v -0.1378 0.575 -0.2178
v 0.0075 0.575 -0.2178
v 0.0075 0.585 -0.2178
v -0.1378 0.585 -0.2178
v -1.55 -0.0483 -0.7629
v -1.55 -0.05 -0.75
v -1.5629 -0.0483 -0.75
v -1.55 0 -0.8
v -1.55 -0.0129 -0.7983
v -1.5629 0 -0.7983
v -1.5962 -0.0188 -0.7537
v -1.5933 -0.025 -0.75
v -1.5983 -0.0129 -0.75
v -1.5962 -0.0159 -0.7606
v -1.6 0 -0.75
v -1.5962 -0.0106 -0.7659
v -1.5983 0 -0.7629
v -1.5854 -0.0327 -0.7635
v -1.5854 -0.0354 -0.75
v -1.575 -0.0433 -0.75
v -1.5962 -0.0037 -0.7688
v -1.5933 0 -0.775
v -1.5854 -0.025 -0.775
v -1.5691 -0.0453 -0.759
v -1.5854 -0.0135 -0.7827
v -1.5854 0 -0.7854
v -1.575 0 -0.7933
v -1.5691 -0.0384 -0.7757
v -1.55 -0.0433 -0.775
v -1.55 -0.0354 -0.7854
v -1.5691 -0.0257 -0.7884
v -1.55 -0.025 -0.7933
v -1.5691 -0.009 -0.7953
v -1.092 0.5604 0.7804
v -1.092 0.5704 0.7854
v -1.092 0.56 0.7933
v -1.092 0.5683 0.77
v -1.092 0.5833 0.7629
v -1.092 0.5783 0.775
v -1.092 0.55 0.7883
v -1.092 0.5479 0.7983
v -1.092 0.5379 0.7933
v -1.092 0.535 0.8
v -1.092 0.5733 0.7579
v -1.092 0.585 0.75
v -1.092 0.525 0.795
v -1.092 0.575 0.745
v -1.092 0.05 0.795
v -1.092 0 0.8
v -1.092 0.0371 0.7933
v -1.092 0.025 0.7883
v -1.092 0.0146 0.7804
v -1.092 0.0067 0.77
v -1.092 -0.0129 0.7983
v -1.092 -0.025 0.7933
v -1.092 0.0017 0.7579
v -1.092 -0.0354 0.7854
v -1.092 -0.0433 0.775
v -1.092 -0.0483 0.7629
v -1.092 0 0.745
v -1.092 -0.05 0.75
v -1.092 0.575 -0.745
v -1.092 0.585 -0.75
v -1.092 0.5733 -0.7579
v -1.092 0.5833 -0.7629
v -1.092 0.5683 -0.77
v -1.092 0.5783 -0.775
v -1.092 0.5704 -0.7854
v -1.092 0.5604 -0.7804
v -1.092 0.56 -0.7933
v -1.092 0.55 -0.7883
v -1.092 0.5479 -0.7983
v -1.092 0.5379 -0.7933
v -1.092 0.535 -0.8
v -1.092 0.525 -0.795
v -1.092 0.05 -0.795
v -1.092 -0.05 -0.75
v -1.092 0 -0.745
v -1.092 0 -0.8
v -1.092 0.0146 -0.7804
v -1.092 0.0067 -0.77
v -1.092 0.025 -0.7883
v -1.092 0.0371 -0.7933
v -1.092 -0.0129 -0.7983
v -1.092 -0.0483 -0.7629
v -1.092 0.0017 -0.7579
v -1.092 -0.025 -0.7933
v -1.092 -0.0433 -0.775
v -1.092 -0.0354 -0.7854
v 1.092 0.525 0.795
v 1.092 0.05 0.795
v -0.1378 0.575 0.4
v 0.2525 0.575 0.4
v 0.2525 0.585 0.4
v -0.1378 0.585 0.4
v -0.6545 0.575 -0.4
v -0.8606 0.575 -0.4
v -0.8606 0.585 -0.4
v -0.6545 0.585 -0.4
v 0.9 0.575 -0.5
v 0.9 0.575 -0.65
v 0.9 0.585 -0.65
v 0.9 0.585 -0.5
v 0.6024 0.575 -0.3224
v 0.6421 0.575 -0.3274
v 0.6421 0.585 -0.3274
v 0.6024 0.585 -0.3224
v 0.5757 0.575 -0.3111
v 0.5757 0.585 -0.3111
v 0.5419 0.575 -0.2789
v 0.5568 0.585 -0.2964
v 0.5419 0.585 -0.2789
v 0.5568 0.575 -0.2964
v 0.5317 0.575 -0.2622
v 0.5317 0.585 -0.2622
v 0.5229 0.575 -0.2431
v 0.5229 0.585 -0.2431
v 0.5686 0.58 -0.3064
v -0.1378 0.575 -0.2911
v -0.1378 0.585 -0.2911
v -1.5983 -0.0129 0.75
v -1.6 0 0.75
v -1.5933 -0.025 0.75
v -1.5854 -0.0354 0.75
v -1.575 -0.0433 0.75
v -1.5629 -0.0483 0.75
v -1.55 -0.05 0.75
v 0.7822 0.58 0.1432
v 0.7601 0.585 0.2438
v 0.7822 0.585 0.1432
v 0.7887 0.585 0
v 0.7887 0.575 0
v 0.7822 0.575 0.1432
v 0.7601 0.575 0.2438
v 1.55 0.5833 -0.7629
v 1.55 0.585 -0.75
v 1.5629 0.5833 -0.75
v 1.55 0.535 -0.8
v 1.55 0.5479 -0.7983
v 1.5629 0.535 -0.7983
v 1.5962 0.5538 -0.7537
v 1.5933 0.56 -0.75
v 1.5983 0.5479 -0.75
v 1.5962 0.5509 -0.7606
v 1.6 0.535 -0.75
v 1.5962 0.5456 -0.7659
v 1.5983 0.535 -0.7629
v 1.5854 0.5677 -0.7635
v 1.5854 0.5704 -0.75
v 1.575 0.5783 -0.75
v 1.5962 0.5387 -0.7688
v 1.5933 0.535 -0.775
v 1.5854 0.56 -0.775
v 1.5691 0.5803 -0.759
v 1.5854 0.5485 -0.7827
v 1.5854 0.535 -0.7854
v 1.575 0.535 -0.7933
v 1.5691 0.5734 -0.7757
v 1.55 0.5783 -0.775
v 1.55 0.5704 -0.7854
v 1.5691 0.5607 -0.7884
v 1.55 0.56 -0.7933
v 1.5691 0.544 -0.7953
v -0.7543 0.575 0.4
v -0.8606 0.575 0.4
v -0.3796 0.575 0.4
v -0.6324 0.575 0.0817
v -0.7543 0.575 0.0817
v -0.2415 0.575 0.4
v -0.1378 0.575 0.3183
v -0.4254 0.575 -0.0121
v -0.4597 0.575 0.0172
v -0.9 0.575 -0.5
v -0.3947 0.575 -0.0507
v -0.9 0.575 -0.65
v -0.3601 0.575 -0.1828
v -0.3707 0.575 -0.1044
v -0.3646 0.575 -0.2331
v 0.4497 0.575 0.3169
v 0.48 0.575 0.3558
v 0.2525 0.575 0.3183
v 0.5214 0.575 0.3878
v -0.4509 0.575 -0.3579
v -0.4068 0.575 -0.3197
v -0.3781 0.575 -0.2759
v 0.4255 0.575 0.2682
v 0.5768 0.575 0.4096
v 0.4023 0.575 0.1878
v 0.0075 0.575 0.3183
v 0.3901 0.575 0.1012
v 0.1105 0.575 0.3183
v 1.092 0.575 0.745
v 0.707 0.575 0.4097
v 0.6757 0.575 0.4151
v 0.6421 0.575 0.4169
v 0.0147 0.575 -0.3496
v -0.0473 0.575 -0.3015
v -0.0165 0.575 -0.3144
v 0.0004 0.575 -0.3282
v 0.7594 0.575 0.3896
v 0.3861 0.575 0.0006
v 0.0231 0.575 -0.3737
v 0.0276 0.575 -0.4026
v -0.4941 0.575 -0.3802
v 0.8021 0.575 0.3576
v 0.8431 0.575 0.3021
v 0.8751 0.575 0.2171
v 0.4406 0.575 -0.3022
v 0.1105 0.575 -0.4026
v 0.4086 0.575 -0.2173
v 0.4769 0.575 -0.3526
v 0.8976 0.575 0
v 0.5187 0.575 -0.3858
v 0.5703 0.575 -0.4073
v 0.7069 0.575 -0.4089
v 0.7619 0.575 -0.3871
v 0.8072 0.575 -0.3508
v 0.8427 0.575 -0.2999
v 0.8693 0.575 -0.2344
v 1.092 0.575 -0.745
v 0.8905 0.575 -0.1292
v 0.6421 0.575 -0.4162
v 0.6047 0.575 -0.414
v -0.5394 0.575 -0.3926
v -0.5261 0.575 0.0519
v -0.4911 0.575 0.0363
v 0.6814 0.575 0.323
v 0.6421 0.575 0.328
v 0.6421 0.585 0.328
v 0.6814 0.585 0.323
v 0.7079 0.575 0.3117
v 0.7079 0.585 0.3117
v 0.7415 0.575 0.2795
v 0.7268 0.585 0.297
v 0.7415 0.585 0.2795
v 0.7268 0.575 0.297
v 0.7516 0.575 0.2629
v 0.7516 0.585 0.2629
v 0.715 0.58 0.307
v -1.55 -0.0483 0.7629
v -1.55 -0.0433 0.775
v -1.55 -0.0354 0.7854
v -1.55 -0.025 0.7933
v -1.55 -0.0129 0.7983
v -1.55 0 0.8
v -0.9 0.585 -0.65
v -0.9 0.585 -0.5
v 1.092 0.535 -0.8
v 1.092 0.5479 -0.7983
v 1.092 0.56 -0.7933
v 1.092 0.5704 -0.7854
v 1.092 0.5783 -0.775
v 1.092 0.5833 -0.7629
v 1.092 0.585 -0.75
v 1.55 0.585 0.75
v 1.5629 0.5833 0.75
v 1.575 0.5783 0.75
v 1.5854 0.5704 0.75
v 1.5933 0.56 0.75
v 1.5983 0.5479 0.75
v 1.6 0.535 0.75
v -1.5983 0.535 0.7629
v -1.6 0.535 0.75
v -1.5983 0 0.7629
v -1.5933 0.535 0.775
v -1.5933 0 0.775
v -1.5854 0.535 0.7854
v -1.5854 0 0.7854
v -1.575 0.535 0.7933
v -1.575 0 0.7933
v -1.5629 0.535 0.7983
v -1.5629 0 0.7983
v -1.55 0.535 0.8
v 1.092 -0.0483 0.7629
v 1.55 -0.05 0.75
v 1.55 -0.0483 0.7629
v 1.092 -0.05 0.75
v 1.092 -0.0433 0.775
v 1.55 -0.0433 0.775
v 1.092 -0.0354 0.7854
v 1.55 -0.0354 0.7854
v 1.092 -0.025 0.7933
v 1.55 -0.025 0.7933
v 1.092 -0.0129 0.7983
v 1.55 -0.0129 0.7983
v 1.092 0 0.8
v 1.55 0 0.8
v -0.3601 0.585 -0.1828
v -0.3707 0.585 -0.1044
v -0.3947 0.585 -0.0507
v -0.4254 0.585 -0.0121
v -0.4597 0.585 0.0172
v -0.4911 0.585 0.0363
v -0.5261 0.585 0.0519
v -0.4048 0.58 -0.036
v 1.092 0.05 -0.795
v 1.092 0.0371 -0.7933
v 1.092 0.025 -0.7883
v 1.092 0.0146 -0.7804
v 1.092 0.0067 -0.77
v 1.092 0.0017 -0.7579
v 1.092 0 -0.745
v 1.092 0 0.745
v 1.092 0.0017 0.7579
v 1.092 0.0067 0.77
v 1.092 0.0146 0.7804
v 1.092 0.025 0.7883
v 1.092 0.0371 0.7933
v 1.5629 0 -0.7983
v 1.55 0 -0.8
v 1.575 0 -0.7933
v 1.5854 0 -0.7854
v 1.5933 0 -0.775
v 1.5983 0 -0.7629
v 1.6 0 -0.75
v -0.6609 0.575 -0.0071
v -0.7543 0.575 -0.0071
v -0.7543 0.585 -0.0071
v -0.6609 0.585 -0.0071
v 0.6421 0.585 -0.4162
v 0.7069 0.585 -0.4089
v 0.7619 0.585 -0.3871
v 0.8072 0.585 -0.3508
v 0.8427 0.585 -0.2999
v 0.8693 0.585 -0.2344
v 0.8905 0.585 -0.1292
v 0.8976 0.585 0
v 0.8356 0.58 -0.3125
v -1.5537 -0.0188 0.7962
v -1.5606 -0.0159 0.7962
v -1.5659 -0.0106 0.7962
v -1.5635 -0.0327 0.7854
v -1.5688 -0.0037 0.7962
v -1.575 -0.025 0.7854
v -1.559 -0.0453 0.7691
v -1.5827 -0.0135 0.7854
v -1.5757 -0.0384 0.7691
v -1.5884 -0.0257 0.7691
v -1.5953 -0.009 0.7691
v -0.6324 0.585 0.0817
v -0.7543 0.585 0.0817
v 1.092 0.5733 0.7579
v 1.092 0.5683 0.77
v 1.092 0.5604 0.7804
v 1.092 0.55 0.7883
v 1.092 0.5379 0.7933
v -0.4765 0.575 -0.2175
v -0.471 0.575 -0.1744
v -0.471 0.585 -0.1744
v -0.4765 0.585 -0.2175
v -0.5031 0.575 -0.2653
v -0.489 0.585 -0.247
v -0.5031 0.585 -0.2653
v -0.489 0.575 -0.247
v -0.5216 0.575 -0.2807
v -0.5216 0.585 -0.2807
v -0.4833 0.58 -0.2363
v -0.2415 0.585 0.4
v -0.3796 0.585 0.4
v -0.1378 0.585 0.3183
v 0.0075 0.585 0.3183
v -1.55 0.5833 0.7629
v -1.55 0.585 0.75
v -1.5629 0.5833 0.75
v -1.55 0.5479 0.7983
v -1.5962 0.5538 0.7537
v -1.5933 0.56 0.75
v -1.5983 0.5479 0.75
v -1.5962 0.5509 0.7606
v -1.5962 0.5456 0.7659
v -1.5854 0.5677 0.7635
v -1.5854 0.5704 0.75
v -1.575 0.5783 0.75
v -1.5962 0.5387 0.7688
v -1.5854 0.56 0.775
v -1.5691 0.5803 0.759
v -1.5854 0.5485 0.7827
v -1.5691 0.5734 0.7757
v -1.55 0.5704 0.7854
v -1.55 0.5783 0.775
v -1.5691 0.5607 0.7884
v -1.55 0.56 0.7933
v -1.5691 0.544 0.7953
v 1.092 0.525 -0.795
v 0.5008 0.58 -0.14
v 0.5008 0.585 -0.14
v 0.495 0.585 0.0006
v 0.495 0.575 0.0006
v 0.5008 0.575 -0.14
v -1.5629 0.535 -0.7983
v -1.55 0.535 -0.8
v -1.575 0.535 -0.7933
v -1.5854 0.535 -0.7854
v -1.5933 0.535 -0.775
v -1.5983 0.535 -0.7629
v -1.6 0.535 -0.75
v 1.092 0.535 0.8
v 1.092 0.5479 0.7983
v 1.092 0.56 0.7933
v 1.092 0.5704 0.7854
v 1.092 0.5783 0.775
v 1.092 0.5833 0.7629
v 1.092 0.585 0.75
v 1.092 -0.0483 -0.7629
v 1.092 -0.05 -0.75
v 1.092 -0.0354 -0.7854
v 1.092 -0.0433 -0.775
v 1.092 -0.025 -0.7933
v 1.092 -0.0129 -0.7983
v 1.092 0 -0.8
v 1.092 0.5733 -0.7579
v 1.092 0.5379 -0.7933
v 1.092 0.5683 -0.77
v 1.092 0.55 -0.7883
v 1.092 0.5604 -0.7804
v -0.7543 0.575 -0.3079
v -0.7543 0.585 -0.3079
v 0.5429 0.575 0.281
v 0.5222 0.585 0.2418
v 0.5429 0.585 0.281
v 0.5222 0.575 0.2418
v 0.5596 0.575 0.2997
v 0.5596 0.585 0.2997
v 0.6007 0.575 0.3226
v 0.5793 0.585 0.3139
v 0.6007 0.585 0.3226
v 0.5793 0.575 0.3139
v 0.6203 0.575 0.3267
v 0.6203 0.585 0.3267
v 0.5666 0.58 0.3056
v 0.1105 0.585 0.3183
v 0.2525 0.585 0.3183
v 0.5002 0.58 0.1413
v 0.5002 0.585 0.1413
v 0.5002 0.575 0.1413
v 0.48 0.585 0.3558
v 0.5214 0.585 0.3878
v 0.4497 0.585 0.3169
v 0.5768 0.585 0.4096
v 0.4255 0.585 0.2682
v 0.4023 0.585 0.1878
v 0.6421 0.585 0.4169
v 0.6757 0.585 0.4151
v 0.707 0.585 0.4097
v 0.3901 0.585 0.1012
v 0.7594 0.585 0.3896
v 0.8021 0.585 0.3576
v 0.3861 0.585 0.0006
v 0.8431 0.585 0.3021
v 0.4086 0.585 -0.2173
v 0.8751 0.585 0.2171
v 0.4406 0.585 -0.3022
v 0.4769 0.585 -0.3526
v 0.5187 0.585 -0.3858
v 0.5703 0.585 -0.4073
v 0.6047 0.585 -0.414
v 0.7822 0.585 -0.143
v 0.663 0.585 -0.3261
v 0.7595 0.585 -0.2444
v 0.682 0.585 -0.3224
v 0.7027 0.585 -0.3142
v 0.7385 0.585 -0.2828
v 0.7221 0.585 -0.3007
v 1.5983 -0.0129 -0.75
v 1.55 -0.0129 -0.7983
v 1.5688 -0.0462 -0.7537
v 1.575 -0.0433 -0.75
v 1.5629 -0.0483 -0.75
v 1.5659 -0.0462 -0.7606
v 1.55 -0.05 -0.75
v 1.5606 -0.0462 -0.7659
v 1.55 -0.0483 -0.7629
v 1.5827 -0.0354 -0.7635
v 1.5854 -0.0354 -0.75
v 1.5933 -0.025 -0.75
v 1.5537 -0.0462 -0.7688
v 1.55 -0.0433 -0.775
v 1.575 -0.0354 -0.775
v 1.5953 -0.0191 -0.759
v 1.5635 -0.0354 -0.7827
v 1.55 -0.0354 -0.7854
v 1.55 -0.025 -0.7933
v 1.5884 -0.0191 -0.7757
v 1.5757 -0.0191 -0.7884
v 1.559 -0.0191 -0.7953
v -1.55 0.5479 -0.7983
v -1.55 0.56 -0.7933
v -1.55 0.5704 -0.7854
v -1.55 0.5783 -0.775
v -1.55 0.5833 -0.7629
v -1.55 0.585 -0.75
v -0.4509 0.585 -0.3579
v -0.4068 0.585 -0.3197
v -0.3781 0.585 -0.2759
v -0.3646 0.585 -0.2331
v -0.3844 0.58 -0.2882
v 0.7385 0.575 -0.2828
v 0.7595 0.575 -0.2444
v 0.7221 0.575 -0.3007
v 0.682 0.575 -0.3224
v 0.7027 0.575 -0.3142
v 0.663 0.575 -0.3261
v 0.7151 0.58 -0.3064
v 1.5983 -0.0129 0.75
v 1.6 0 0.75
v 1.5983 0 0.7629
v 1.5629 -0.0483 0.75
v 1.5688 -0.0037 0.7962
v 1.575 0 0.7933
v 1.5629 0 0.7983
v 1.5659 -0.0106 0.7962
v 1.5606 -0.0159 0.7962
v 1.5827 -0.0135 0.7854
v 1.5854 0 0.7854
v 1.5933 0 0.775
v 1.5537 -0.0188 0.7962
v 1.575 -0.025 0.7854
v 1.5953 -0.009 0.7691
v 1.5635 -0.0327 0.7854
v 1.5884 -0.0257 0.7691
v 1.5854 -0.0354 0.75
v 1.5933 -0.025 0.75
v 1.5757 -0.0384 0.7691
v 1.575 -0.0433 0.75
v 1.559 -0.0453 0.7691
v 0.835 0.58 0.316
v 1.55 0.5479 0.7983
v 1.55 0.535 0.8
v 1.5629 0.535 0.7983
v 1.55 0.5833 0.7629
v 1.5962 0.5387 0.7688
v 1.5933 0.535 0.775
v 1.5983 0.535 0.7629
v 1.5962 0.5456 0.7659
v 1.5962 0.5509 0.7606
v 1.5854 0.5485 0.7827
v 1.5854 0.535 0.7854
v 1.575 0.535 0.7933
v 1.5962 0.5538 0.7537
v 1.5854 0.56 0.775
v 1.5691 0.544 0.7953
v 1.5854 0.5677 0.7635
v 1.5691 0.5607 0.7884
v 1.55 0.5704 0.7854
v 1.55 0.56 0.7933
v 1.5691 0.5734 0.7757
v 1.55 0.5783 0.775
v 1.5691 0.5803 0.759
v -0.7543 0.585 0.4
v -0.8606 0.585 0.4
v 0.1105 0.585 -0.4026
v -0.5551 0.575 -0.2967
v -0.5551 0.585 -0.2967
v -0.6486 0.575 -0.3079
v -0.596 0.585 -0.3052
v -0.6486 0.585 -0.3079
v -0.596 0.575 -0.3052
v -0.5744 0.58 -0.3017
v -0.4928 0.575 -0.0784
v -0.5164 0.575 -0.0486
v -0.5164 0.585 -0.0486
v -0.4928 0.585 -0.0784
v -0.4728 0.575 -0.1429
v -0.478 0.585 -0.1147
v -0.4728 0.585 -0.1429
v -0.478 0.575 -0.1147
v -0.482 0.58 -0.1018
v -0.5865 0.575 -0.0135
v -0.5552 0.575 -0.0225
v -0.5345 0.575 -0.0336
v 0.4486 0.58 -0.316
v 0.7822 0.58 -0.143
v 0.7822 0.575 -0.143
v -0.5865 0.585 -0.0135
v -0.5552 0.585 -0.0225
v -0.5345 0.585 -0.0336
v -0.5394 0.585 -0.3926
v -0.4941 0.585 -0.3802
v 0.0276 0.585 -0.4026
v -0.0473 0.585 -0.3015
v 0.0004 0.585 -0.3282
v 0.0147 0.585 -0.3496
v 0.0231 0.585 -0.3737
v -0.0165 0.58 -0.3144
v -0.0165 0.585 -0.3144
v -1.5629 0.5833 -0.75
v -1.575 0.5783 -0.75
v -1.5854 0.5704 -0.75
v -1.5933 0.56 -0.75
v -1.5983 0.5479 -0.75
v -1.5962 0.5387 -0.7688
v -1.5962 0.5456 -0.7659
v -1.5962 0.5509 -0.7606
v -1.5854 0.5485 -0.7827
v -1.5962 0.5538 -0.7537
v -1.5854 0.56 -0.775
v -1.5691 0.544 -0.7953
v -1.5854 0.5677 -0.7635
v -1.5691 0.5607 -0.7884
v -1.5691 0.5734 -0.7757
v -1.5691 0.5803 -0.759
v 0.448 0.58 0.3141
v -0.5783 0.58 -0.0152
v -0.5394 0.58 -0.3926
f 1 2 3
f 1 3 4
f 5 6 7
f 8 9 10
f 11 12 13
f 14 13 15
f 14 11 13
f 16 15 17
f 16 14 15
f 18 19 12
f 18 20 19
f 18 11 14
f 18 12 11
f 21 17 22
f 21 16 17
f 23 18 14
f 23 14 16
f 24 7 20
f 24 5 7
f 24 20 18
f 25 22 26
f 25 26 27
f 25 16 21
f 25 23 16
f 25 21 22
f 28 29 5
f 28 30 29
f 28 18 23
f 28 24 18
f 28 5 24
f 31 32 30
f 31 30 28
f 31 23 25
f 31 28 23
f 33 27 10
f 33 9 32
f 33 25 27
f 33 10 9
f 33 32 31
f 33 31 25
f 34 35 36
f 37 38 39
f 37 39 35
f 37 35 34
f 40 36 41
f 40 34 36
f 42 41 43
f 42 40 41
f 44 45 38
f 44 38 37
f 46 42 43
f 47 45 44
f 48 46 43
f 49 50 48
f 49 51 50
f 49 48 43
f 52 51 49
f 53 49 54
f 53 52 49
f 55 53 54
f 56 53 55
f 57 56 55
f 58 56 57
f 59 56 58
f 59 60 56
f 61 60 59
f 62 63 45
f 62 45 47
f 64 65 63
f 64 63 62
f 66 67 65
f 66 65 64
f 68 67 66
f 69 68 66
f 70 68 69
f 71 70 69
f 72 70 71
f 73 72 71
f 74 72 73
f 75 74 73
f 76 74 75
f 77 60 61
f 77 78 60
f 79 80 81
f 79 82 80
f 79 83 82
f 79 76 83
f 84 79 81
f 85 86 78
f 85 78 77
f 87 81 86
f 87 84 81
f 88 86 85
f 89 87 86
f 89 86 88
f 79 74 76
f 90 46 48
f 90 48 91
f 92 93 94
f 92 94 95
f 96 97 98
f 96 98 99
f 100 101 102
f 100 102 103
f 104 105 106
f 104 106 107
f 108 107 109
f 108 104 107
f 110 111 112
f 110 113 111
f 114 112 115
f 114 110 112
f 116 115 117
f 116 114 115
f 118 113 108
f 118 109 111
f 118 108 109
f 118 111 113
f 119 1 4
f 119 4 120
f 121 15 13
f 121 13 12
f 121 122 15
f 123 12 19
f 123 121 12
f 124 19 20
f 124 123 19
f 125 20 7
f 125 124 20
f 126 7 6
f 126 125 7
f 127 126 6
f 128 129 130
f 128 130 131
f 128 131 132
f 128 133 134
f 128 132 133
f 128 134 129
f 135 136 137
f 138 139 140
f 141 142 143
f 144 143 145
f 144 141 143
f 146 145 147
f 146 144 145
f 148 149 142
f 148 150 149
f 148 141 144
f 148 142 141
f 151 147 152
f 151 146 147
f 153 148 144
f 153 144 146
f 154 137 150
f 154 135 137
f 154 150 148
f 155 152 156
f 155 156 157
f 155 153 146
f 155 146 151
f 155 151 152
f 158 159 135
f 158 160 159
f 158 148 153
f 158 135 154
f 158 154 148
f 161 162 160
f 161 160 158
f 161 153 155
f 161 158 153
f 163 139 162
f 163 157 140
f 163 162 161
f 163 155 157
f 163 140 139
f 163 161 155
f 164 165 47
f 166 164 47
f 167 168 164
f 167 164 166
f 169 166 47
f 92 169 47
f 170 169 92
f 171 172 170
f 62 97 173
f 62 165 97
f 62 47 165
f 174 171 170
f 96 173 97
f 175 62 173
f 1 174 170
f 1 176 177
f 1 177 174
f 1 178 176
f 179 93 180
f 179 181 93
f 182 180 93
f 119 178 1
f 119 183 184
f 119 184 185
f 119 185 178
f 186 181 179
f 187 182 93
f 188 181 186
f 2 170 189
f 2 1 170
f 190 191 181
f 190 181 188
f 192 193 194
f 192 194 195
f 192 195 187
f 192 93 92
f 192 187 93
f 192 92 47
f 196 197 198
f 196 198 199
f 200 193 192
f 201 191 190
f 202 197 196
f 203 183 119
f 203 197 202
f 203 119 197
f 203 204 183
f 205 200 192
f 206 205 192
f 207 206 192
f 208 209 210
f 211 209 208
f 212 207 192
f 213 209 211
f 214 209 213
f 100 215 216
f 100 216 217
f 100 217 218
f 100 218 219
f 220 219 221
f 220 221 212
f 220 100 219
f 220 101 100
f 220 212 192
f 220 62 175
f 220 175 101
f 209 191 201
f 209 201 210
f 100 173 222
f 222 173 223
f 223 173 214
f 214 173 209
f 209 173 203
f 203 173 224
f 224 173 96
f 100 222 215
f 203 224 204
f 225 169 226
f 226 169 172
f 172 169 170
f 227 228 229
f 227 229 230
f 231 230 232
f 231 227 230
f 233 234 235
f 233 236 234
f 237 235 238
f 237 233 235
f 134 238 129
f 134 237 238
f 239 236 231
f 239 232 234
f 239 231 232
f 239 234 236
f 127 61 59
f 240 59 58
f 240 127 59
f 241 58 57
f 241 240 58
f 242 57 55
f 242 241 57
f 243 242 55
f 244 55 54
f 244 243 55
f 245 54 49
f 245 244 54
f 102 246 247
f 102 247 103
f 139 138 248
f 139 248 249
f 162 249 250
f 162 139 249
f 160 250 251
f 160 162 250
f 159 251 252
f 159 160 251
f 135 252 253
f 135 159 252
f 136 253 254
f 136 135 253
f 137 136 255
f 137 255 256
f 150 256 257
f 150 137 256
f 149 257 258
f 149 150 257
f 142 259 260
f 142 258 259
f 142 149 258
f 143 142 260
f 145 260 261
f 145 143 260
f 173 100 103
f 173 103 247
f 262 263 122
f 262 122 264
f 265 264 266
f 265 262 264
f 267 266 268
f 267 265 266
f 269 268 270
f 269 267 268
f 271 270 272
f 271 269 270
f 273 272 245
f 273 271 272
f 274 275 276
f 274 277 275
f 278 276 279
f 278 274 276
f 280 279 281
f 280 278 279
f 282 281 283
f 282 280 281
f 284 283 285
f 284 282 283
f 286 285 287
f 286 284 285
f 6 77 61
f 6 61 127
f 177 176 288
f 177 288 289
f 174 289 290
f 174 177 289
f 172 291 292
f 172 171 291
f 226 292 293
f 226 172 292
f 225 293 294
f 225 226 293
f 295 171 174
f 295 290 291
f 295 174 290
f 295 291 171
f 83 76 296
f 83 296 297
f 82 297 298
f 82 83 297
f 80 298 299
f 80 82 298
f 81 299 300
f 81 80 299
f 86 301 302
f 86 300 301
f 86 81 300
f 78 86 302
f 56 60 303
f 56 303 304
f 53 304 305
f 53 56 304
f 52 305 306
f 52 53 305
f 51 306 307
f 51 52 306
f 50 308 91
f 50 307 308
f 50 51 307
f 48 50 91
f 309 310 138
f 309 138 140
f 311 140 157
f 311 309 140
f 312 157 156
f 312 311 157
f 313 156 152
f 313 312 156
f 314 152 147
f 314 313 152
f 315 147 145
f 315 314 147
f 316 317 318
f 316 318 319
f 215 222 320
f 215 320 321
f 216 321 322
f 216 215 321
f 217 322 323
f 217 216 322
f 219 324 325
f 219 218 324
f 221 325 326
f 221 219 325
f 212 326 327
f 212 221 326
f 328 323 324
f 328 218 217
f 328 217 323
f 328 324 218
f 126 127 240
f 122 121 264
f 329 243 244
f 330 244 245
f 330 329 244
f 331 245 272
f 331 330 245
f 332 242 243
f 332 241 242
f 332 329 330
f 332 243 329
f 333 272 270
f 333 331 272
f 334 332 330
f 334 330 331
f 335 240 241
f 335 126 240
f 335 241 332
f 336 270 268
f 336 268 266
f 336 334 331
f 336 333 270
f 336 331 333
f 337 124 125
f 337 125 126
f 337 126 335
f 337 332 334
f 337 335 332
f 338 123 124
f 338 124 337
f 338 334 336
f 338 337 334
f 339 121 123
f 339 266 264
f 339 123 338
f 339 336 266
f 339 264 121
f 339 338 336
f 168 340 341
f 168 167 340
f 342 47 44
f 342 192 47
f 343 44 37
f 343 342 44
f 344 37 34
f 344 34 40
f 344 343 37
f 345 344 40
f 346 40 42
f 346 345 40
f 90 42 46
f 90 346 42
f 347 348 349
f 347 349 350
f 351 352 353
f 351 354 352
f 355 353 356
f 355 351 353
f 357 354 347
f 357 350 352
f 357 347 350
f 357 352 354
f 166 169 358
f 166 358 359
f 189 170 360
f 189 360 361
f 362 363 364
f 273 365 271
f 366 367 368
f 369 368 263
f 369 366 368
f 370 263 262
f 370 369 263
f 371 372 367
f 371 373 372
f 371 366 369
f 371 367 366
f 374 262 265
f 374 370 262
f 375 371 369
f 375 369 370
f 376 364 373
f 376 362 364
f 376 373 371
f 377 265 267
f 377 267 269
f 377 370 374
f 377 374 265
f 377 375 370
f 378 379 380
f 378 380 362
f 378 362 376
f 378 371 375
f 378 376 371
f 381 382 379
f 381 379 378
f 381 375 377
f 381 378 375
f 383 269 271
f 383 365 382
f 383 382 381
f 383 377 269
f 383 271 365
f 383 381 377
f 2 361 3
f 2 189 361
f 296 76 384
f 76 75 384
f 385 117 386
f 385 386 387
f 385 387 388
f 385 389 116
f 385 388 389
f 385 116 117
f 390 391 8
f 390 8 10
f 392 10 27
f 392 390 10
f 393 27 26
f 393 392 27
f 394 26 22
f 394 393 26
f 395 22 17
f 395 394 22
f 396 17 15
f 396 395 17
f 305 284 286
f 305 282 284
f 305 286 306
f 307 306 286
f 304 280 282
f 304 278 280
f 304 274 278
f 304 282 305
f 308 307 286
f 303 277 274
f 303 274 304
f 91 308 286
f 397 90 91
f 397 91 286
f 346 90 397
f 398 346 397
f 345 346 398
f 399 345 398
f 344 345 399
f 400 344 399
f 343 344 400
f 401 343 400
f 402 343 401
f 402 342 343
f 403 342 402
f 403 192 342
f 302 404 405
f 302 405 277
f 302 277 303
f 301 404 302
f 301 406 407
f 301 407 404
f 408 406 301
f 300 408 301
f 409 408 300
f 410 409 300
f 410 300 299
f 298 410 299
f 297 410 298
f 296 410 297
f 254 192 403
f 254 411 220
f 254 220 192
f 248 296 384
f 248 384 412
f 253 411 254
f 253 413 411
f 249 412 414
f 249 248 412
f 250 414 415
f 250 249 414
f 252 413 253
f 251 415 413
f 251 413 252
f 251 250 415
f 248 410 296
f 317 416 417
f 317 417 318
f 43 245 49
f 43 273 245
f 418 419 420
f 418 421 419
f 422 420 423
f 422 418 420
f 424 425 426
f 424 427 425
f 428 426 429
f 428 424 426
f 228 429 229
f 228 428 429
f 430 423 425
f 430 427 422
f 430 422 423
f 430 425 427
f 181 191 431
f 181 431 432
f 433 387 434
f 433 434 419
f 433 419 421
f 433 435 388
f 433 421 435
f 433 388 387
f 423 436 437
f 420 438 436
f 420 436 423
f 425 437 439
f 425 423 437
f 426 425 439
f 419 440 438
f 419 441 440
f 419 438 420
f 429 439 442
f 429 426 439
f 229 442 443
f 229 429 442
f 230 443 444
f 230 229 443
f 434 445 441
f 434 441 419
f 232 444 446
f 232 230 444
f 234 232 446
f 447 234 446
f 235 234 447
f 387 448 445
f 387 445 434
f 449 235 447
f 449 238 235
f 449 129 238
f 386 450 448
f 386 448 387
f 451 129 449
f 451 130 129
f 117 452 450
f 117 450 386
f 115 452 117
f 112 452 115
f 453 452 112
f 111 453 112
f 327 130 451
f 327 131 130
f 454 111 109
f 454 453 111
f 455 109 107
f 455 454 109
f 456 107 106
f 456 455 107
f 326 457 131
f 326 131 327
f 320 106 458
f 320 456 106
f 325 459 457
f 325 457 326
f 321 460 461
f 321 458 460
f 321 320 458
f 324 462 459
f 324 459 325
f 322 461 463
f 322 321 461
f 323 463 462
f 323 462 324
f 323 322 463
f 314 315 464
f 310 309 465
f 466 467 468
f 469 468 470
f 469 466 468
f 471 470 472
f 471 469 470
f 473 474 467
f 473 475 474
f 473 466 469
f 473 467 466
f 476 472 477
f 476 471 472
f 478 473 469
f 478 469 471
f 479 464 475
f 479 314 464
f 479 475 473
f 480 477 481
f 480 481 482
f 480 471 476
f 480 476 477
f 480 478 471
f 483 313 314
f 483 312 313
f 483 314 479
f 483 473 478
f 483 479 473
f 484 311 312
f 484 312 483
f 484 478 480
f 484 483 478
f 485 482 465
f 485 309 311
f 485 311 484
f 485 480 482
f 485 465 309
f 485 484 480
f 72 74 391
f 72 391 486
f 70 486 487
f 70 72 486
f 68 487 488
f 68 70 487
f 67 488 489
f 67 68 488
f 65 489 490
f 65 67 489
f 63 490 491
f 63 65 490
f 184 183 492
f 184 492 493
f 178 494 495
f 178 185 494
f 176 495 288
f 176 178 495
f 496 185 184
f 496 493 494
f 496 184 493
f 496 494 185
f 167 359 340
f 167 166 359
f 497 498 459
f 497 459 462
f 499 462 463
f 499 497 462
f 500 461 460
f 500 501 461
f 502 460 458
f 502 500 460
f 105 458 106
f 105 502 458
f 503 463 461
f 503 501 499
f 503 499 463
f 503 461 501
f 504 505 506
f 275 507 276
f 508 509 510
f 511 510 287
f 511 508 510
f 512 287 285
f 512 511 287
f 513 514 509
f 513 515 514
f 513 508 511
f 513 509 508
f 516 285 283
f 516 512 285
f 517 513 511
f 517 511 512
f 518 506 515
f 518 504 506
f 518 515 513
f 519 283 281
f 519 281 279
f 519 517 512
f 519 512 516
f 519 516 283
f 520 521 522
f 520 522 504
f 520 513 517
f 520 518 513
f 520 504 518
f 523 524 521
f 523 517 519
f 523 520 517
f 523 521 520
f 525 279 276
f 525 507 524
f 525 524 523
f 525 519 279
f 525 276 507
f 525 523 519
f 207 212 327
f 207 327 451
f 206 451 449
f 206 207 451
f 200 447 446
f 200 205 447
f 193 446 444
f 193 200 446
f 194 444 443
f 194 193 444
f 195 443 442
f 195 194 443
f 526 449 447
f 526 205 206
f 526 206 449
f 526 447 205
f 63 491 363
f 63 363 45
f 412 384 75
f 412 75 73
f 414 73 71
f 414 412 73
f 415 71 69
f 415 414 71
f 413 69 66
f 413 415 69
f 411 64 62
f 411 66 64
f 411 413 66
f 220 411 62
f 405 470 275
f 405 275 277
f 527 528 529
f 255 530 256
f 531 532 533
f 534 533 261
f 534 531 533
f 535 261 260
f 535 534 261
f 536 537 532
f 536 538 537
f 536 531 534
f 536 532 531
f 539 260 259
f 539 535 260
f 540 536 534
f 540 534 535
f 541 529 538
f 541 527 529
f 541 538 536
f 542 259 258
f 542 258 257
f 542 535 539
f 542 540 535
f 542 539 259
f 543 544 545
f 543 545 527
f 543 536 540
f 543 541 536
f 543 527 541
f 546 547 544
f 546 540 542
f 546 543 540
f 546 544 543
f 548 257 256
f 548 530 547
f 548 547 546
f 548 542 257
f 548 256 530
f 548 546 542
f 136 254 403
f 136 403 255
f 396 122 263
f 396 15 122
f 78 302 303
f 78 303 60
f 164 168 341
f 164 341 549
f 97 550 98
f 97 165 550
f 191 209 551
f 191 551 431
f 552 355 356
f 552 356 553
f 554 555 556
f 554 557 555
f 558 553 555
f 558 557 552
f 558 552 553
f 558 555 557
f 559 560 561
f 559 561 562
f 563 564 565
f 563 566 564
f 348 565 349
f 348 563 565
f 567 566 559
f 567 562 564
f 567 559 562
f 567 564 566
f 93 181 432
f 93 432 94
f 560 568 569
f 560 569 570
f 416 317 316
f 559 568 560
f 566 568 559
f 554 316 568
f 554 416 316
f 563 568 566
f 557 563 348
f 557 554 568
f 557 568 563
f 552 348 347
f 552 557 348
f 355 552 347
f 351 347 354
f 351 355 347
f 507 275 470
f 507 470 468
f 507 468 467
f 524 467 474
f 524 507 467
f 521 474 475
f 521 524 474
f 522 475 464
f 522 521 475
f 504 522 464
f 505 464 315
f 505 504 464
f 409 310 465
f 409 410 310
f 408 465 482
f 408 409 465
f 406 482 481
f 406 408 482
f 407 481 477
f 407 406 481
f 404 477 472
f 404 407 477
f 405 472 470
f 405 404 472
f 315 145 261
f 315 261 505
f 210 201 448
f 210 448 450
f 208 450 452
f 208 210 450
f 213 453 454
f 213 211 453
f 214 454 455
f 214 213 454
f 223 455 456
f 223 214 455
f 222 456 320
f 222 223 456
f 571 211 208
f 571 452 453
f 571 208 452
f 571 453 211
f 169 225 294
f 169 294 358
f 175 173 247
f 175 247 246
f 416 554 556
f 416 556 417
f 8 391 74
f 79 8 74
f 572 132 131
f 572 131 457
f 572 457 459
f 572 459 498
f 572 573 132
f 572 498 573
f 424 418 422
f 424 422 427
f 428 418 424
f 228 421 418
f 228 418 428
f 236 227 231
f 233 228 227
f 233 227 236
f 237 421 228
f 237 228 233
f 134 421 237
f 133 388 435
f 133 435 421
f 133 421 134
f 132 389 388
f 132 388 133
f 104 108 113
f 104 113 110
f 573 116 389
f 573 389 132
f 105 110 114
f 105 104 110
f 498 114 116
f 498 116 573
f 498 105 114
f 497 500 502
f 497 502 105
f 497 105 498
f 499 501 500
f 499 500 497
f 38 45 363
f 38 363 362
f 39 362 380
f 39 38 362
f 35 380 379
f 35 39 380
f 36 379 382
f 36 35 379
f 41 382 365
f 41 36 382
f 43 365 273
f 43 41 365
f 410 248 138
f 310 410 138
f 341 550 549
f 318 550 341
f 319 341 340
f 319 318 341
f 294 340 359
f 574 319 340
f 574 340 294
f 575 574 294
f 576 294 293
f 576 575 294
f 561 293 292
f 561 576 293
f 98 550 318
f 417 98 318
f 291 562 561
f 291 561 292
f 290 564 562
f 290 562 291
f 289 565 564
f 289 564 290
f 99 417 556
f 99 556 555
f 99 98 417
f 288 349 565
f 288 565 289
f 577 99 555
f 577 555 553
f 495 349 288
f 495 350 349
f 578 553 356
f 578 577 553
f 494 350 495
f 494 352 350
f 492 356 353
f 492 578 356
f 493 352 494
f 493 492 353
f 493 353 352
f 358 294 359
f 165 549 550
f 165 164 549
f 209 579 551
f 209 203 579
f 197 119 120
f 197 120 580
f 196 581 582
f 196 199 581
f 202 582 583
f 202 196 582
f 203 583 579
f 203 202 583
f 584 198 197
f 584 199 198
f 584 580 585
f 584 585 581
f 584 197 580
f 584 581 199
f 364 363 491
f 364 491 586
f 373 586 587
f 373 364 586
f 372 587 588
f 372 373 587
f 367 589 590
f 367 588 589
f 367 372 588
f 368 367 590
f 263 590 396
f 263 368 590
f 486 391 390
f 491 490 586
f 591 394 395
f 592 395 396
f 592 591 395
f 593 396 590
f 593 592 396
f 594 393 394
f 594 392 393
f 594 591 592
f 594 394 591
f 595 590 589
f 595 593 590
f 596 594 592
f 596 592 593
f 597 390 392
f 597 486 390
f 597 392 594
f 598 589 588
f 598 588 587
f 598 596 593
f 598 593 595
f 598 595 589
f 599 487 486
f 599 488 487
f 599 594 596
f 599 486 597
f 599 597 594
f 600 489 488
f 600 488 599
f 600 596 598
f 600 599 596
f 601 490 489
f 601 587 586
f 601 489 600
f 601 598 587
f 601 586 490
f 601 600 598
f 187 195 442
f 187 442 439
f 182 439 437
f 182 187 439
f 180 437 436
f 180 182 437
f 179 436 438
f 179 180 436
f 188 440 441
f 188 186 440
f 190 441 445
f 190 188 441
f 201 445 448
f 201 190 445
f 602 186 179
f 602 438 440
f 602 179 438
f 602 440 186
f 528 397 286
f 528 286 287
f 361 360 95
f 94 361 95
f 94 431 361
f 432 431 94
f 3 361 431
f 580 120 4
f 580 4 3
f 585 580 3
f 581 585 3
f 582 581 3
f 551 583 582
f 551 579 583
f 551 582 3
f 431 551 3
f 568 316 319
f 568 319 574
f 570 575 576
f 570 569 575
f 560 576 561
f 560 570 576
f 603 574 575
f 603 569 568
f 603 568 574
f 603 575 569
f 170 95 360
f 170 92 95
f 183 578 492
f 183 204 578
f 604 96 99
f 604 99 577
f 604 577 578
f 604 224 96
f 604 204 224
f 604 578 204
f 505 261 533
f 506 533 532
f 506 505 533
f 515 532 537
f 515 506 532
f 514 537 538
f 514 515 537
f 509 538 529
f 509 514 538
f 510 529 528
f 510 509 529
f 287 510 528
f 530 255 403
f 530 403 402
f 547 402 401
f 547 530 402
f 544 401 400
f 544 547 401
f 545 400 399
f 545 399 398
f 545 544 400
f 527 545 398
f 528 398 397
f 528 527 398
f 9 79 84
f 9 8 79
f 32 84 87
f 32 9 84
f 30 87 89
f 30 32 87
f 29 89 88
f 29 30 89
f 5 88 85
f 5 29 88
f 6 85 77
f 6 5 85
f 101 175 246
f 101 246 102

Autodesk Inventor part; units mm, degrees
ref_plane "YZ Plane" through (0, 0, 0) normal (1, 0, 0) x (0, 1, 0)
ref_plane "XZ Plane" through (0, 0, 0) normal (0, 1, 0) x (-1, 0, 0)
ref_plane "XY Plane" through (0, 0, 0) normal (0, 0, 1) x (1, 0, 0)
sketch "Sketch1" plane through (0, 0, 0) normal (0, 0, 1) x (1, 0, 0)
  line L0 (-1.6, 0.585) -> (-1.092, 0.585)
  line L1 (-1.092, 0.585) -> (-1.092, -0.05)
  line L2 (-1.092, -0.05) -> (-1.6, -0.05)
  line L3 (-1.6, -0.05) -> (-1.6, 0.585)
  line L4 (-1.092, 0.575) -> (1.092, 0.575)
  line L5 (1.092, 0.575) -> (1.092, 0)
  line L6 (1.092, 0) -> (-1.092, 0)
  line L7 (-1.092, 0) -> (-1.092, 0.575)
  line L8 (1.092, 0.585) -> (1.6, 0.585)
  line L9 (1.6, 0.585) -> (1.6, -0.05)
  line L10 (1.6, -0.05) -> (1.092, -0.05)
  line L11 (1.092, -0.05) -> (1.092, 0.585)
  point P0 (0, 0)
  point P1 (0, 0.575)
  point P2 (0, 0)
  dimension "d0" = 3.2
  dimension "d1" = 0.635
  dimension "d2" = 0.508
  dimension "d3" = 0.05
  dimension "d6" = 0.01
extrude "Extrusion1" add sketch "Sketch1" along normal mid plane 1.6 contours L0 L1 L2 L3 | L11 L8 L9 L10 L5
extrude "Extrusion2" add sketch "Sketch1" along normal mid plane 1.59 contours L4 L5 L6 L1
sketch "Sketch3" plane through (-1.092, 0.575, 0.84) normal (0, 1, 0) x (1, 0, 0)
  line L0 (0, 0.045) -> (0, 1.635) projected
  line L1 (2.184, 0.045) -> (0, 0.045) projected
  line L2 (2.184, 1.635) -> (2.184, 0.045) projected
  line L3 (0, 1.635) -> (2.184, 1.635) projected
  line L4 (2.184, 1.64) -> (2.184, 0.04) construction
  line L5 (2.184, 0.84) -> (0, 0.84) construction
  line L6 (0, 1.64) -> (0, 0.04) construction
  line L7 (0.192, 1.49) -> (1.992, 1.49)
  line L8 (1.992, 1.49) -> (1.992, 1.34)
  line L9 (1.992, 1.34) -> (0.192, 1.34)
  line L10 (0.192, 1.34) -> (0.192, 1.49)
  line L11 (0.8505, 0.44) -> (0.7124, 0.44)
  line L12 (0.7124, 0.44) -> (0.4596, 0.7583)
  line L13 (0.4596, 0.7583) -> (0.3377, 0.7583)
  line L14 (0.3377, 0.7583) -> (0.3377, 0.44)
  line L15 (0.3377, 0.44) -> (0.2314, 0.44)
  line L16 (0.2314, 0.44) -> (0.2314, 1.24)
  line L17 (0.2314, 1.24) -> (0.4375, 1.24)
  spline S0 degree 2 poles (0.4375, 1.24) (0.5063, 1.24) (0.599, 1.2251) (0.6411, 1.1979) knots 0 0 0 1 2 2 2
  spline S1 degree 2 poles (0.6411, 1.1979) (0.6832, 1.1706) (0.7319, 1.0857) (0.7319, 1.0228) knots 0 0 0 1 2 2 2
  spline S2 degree 2 poles (0.7319, 1.0228) (0.7319, 0.9353) (0.6424, 0.8167) (0.5659, 0.7881) knots 0 0 0 1 2 2 2
  line L18 (0.5659, 0.7881) -> (0.8505, 0.44)
  spline S3 degree 2 poles (0.621, 1.0144) (0.621, 1.0494) (0.5964, 1.1032) (0.5704, 1.1207) knots 0 0 0 1 2 2 2
  spline S4 degree 2 poles (0.5704, 1.1207) (0.5478, 1.1356) (0.4875, 1.1479) (0.4434, 1.1479) knots 0 0 0 1 2 2 2
  line L19 (0.4434, 1.1479) -> (0.3377, 1.1479)
  line L20 (0.3377, 1.1479) -> (0.3377, 0.8471)
  line L21 (0.3377, 0.8471) -> (0.4311, 0.8471)
  spline S5 degree 2 poles (0.4311, 0.8471) (0.4771, 0.8471) (0.5503, 0.8633) (0.5756, 0.8886) knots 0 0 0 1 2 2 2
  spline S6 degree 2 poles (0.5756, 0.8886) (0.599, 0.9107) (0.621, 0.9729) (0.621, 1.0144) knots 0 0 0 1 2 2 2
  line L22 (1.3445, 0.44) -> (0.9542, 0.44)
  line L23 (0.9542, 0.44) -> (0.9542, 0.5217)
  line L24 (0.9542, 0.5217) -> (1.0995, 0.5217)
  line L25 (1.0995, 0.5217) -> (1.0995, 1.0578)
  line L26 (1.0995, 1.0578) -> (0.9542, 1.0578)
  line L27 (0.9542, 1.0578) -> (0.9542, 1.1311)
  spline S7 degree 2 poles (0.9542, 1.1311) (1.0366, 1.1311) (1.1144, 1.1778) (1.1196, 1.2426) knots 0 0 0 1 2 2 2
  line L28 (1.1196, 1.2426) -> (1.2025, 1.2426)
  line L29 (1.2025, 1.2426) -> (1.2025, 0.5217)
  line L30 (1.2025, 0.5217) -> (1.3445, 0.5217)
  line L31 (1.3445, 0.5217) -> (1.3445, 0.44)
  spline S8 degree 2 poles (1.9896, 0.84) (1.9896, 0.6248) (1.8644, 0.4231) (1.7341, 0.4231) knots 0 0 0 1 2 2 2
  spline S9 degree 2 poles (1.7341, 0.4231) (1.6019, 0.4231) (1.4781, 0.6287) (1.4781, 0.8394) knots 0 0 0 1 2 2 2
  spline S10 degree 2 poles (1.4781, 0.8394) (1.4781, 1.0559) (1.6032, 1.2562) (1.7341, 1.2562) knots 0 0 0 1 2 2 2
  spline S11 degree 2 poles (1.7341, 1.2562) (1.8657, 1.2562) (1.9896, 1.0488) (1.9896, 0.84) knots 0 0 0 1 2 2 2
  spline S12 degree 2 poles (1.8521, 0.5962) (1.8677, 0.6358) (1.8807, 0.7577) (1.8807, 0.84) knots 0 0 0 1 2 2 2
  spline S13 degree 2 poles (1.8807, 0.84) (1.8807, 0.9223) (1.8677, 1.0436) (1.8515, 1.0844) knots 0 0 0 1 2 2 2
  spline S14 degree 2 poles (1.8515, 1.0844) (1.8353, 1.1253) (1.7789, 1.1674) (1.7341, 1.1674) knots 0 0 0 1 2 2 2
  spline S15 degree 2 poles (1.7341, 1.1674) (1.6894, 1.1674) (1.6317, 1.1253) (1.6149, 1.0831) knots 0 0 0 1 2 2 2
  spline S16 degree 2 poles (1.6149, 1.0831) (1.5986, 1.0423) (1.587, 0.9178) (1.587, 0.8394) knots 0 0 0 1 2 2 2
  spline S17 degree 2 poles (1.587, 0.8394) (1.587, 0.7551) (1.5973, 0.6423) (1.6142, 0.5982) knots 0 0 0 1 2 2 2
  spline S18 degree 2 poles (1.6142, 0.5982) (1.6298, 0.5567) (1.6875, 0.512) (1.7341, 0.512) knots 0 0 0 1 2 2 2
  spline S19 degree 2 poles (1.7341, 0.512) (1.7782, 0.512) (1.8359, 0.5541) (1.8521, 0.5962) knots 0 0 0 1 2 2 2
  point P0 (1.092, 0.84)
  point P1 (1.092, 1.34)
  point P2 (1.092, 0.84)
  dimension "d15" = 0.15
  dimension "d16" = 1.8
  dimension "d17" = 0.5
extrude "Extrusion4" add sketch "Sketch3" along normal blind 0.01 contours L7 L8 L9 L10 | L11 L12 L13 L14 L15 L16 L17 S0 S1 S2 L18 | L22 L23 L24 L25 L26 L27 S7 L28 L29 L30 L31 | S8 S9 S10 S11
fillet "Fillet2" radius 0.05 4 edges at (0, 0.575, 0.795) (0, 0, 0.795) (0, 0.575, -0.795) (0, 0, -0.795)
fillet "Fillet1" radius 0.05 16 edges at (-1.346, 0.585, 0.8) (1.346, 0.585, 0.8) (-1.346, 0.585, -0.8) (1.346, 0.585, -0.8) (1.6, 0.585, 0) (1.6, 0.2675, -0.8) (1.6, -0.05, 0) (1.346, -0.05, -0.8) (1.346, -0.05, 0.8) (1.6, 0.2675, 0.8) (-1.346, -0.05, -0.8) (-1.6, -0.05, 0) (-1.6, 0.2675, 0.8) (-1.346, -0.05, 0.8) (-1.6, 0.2675, -0.8) (-1.6, 0.585, 0)
properties part number "Resistor_1608-0.5mm" material "Copper"
